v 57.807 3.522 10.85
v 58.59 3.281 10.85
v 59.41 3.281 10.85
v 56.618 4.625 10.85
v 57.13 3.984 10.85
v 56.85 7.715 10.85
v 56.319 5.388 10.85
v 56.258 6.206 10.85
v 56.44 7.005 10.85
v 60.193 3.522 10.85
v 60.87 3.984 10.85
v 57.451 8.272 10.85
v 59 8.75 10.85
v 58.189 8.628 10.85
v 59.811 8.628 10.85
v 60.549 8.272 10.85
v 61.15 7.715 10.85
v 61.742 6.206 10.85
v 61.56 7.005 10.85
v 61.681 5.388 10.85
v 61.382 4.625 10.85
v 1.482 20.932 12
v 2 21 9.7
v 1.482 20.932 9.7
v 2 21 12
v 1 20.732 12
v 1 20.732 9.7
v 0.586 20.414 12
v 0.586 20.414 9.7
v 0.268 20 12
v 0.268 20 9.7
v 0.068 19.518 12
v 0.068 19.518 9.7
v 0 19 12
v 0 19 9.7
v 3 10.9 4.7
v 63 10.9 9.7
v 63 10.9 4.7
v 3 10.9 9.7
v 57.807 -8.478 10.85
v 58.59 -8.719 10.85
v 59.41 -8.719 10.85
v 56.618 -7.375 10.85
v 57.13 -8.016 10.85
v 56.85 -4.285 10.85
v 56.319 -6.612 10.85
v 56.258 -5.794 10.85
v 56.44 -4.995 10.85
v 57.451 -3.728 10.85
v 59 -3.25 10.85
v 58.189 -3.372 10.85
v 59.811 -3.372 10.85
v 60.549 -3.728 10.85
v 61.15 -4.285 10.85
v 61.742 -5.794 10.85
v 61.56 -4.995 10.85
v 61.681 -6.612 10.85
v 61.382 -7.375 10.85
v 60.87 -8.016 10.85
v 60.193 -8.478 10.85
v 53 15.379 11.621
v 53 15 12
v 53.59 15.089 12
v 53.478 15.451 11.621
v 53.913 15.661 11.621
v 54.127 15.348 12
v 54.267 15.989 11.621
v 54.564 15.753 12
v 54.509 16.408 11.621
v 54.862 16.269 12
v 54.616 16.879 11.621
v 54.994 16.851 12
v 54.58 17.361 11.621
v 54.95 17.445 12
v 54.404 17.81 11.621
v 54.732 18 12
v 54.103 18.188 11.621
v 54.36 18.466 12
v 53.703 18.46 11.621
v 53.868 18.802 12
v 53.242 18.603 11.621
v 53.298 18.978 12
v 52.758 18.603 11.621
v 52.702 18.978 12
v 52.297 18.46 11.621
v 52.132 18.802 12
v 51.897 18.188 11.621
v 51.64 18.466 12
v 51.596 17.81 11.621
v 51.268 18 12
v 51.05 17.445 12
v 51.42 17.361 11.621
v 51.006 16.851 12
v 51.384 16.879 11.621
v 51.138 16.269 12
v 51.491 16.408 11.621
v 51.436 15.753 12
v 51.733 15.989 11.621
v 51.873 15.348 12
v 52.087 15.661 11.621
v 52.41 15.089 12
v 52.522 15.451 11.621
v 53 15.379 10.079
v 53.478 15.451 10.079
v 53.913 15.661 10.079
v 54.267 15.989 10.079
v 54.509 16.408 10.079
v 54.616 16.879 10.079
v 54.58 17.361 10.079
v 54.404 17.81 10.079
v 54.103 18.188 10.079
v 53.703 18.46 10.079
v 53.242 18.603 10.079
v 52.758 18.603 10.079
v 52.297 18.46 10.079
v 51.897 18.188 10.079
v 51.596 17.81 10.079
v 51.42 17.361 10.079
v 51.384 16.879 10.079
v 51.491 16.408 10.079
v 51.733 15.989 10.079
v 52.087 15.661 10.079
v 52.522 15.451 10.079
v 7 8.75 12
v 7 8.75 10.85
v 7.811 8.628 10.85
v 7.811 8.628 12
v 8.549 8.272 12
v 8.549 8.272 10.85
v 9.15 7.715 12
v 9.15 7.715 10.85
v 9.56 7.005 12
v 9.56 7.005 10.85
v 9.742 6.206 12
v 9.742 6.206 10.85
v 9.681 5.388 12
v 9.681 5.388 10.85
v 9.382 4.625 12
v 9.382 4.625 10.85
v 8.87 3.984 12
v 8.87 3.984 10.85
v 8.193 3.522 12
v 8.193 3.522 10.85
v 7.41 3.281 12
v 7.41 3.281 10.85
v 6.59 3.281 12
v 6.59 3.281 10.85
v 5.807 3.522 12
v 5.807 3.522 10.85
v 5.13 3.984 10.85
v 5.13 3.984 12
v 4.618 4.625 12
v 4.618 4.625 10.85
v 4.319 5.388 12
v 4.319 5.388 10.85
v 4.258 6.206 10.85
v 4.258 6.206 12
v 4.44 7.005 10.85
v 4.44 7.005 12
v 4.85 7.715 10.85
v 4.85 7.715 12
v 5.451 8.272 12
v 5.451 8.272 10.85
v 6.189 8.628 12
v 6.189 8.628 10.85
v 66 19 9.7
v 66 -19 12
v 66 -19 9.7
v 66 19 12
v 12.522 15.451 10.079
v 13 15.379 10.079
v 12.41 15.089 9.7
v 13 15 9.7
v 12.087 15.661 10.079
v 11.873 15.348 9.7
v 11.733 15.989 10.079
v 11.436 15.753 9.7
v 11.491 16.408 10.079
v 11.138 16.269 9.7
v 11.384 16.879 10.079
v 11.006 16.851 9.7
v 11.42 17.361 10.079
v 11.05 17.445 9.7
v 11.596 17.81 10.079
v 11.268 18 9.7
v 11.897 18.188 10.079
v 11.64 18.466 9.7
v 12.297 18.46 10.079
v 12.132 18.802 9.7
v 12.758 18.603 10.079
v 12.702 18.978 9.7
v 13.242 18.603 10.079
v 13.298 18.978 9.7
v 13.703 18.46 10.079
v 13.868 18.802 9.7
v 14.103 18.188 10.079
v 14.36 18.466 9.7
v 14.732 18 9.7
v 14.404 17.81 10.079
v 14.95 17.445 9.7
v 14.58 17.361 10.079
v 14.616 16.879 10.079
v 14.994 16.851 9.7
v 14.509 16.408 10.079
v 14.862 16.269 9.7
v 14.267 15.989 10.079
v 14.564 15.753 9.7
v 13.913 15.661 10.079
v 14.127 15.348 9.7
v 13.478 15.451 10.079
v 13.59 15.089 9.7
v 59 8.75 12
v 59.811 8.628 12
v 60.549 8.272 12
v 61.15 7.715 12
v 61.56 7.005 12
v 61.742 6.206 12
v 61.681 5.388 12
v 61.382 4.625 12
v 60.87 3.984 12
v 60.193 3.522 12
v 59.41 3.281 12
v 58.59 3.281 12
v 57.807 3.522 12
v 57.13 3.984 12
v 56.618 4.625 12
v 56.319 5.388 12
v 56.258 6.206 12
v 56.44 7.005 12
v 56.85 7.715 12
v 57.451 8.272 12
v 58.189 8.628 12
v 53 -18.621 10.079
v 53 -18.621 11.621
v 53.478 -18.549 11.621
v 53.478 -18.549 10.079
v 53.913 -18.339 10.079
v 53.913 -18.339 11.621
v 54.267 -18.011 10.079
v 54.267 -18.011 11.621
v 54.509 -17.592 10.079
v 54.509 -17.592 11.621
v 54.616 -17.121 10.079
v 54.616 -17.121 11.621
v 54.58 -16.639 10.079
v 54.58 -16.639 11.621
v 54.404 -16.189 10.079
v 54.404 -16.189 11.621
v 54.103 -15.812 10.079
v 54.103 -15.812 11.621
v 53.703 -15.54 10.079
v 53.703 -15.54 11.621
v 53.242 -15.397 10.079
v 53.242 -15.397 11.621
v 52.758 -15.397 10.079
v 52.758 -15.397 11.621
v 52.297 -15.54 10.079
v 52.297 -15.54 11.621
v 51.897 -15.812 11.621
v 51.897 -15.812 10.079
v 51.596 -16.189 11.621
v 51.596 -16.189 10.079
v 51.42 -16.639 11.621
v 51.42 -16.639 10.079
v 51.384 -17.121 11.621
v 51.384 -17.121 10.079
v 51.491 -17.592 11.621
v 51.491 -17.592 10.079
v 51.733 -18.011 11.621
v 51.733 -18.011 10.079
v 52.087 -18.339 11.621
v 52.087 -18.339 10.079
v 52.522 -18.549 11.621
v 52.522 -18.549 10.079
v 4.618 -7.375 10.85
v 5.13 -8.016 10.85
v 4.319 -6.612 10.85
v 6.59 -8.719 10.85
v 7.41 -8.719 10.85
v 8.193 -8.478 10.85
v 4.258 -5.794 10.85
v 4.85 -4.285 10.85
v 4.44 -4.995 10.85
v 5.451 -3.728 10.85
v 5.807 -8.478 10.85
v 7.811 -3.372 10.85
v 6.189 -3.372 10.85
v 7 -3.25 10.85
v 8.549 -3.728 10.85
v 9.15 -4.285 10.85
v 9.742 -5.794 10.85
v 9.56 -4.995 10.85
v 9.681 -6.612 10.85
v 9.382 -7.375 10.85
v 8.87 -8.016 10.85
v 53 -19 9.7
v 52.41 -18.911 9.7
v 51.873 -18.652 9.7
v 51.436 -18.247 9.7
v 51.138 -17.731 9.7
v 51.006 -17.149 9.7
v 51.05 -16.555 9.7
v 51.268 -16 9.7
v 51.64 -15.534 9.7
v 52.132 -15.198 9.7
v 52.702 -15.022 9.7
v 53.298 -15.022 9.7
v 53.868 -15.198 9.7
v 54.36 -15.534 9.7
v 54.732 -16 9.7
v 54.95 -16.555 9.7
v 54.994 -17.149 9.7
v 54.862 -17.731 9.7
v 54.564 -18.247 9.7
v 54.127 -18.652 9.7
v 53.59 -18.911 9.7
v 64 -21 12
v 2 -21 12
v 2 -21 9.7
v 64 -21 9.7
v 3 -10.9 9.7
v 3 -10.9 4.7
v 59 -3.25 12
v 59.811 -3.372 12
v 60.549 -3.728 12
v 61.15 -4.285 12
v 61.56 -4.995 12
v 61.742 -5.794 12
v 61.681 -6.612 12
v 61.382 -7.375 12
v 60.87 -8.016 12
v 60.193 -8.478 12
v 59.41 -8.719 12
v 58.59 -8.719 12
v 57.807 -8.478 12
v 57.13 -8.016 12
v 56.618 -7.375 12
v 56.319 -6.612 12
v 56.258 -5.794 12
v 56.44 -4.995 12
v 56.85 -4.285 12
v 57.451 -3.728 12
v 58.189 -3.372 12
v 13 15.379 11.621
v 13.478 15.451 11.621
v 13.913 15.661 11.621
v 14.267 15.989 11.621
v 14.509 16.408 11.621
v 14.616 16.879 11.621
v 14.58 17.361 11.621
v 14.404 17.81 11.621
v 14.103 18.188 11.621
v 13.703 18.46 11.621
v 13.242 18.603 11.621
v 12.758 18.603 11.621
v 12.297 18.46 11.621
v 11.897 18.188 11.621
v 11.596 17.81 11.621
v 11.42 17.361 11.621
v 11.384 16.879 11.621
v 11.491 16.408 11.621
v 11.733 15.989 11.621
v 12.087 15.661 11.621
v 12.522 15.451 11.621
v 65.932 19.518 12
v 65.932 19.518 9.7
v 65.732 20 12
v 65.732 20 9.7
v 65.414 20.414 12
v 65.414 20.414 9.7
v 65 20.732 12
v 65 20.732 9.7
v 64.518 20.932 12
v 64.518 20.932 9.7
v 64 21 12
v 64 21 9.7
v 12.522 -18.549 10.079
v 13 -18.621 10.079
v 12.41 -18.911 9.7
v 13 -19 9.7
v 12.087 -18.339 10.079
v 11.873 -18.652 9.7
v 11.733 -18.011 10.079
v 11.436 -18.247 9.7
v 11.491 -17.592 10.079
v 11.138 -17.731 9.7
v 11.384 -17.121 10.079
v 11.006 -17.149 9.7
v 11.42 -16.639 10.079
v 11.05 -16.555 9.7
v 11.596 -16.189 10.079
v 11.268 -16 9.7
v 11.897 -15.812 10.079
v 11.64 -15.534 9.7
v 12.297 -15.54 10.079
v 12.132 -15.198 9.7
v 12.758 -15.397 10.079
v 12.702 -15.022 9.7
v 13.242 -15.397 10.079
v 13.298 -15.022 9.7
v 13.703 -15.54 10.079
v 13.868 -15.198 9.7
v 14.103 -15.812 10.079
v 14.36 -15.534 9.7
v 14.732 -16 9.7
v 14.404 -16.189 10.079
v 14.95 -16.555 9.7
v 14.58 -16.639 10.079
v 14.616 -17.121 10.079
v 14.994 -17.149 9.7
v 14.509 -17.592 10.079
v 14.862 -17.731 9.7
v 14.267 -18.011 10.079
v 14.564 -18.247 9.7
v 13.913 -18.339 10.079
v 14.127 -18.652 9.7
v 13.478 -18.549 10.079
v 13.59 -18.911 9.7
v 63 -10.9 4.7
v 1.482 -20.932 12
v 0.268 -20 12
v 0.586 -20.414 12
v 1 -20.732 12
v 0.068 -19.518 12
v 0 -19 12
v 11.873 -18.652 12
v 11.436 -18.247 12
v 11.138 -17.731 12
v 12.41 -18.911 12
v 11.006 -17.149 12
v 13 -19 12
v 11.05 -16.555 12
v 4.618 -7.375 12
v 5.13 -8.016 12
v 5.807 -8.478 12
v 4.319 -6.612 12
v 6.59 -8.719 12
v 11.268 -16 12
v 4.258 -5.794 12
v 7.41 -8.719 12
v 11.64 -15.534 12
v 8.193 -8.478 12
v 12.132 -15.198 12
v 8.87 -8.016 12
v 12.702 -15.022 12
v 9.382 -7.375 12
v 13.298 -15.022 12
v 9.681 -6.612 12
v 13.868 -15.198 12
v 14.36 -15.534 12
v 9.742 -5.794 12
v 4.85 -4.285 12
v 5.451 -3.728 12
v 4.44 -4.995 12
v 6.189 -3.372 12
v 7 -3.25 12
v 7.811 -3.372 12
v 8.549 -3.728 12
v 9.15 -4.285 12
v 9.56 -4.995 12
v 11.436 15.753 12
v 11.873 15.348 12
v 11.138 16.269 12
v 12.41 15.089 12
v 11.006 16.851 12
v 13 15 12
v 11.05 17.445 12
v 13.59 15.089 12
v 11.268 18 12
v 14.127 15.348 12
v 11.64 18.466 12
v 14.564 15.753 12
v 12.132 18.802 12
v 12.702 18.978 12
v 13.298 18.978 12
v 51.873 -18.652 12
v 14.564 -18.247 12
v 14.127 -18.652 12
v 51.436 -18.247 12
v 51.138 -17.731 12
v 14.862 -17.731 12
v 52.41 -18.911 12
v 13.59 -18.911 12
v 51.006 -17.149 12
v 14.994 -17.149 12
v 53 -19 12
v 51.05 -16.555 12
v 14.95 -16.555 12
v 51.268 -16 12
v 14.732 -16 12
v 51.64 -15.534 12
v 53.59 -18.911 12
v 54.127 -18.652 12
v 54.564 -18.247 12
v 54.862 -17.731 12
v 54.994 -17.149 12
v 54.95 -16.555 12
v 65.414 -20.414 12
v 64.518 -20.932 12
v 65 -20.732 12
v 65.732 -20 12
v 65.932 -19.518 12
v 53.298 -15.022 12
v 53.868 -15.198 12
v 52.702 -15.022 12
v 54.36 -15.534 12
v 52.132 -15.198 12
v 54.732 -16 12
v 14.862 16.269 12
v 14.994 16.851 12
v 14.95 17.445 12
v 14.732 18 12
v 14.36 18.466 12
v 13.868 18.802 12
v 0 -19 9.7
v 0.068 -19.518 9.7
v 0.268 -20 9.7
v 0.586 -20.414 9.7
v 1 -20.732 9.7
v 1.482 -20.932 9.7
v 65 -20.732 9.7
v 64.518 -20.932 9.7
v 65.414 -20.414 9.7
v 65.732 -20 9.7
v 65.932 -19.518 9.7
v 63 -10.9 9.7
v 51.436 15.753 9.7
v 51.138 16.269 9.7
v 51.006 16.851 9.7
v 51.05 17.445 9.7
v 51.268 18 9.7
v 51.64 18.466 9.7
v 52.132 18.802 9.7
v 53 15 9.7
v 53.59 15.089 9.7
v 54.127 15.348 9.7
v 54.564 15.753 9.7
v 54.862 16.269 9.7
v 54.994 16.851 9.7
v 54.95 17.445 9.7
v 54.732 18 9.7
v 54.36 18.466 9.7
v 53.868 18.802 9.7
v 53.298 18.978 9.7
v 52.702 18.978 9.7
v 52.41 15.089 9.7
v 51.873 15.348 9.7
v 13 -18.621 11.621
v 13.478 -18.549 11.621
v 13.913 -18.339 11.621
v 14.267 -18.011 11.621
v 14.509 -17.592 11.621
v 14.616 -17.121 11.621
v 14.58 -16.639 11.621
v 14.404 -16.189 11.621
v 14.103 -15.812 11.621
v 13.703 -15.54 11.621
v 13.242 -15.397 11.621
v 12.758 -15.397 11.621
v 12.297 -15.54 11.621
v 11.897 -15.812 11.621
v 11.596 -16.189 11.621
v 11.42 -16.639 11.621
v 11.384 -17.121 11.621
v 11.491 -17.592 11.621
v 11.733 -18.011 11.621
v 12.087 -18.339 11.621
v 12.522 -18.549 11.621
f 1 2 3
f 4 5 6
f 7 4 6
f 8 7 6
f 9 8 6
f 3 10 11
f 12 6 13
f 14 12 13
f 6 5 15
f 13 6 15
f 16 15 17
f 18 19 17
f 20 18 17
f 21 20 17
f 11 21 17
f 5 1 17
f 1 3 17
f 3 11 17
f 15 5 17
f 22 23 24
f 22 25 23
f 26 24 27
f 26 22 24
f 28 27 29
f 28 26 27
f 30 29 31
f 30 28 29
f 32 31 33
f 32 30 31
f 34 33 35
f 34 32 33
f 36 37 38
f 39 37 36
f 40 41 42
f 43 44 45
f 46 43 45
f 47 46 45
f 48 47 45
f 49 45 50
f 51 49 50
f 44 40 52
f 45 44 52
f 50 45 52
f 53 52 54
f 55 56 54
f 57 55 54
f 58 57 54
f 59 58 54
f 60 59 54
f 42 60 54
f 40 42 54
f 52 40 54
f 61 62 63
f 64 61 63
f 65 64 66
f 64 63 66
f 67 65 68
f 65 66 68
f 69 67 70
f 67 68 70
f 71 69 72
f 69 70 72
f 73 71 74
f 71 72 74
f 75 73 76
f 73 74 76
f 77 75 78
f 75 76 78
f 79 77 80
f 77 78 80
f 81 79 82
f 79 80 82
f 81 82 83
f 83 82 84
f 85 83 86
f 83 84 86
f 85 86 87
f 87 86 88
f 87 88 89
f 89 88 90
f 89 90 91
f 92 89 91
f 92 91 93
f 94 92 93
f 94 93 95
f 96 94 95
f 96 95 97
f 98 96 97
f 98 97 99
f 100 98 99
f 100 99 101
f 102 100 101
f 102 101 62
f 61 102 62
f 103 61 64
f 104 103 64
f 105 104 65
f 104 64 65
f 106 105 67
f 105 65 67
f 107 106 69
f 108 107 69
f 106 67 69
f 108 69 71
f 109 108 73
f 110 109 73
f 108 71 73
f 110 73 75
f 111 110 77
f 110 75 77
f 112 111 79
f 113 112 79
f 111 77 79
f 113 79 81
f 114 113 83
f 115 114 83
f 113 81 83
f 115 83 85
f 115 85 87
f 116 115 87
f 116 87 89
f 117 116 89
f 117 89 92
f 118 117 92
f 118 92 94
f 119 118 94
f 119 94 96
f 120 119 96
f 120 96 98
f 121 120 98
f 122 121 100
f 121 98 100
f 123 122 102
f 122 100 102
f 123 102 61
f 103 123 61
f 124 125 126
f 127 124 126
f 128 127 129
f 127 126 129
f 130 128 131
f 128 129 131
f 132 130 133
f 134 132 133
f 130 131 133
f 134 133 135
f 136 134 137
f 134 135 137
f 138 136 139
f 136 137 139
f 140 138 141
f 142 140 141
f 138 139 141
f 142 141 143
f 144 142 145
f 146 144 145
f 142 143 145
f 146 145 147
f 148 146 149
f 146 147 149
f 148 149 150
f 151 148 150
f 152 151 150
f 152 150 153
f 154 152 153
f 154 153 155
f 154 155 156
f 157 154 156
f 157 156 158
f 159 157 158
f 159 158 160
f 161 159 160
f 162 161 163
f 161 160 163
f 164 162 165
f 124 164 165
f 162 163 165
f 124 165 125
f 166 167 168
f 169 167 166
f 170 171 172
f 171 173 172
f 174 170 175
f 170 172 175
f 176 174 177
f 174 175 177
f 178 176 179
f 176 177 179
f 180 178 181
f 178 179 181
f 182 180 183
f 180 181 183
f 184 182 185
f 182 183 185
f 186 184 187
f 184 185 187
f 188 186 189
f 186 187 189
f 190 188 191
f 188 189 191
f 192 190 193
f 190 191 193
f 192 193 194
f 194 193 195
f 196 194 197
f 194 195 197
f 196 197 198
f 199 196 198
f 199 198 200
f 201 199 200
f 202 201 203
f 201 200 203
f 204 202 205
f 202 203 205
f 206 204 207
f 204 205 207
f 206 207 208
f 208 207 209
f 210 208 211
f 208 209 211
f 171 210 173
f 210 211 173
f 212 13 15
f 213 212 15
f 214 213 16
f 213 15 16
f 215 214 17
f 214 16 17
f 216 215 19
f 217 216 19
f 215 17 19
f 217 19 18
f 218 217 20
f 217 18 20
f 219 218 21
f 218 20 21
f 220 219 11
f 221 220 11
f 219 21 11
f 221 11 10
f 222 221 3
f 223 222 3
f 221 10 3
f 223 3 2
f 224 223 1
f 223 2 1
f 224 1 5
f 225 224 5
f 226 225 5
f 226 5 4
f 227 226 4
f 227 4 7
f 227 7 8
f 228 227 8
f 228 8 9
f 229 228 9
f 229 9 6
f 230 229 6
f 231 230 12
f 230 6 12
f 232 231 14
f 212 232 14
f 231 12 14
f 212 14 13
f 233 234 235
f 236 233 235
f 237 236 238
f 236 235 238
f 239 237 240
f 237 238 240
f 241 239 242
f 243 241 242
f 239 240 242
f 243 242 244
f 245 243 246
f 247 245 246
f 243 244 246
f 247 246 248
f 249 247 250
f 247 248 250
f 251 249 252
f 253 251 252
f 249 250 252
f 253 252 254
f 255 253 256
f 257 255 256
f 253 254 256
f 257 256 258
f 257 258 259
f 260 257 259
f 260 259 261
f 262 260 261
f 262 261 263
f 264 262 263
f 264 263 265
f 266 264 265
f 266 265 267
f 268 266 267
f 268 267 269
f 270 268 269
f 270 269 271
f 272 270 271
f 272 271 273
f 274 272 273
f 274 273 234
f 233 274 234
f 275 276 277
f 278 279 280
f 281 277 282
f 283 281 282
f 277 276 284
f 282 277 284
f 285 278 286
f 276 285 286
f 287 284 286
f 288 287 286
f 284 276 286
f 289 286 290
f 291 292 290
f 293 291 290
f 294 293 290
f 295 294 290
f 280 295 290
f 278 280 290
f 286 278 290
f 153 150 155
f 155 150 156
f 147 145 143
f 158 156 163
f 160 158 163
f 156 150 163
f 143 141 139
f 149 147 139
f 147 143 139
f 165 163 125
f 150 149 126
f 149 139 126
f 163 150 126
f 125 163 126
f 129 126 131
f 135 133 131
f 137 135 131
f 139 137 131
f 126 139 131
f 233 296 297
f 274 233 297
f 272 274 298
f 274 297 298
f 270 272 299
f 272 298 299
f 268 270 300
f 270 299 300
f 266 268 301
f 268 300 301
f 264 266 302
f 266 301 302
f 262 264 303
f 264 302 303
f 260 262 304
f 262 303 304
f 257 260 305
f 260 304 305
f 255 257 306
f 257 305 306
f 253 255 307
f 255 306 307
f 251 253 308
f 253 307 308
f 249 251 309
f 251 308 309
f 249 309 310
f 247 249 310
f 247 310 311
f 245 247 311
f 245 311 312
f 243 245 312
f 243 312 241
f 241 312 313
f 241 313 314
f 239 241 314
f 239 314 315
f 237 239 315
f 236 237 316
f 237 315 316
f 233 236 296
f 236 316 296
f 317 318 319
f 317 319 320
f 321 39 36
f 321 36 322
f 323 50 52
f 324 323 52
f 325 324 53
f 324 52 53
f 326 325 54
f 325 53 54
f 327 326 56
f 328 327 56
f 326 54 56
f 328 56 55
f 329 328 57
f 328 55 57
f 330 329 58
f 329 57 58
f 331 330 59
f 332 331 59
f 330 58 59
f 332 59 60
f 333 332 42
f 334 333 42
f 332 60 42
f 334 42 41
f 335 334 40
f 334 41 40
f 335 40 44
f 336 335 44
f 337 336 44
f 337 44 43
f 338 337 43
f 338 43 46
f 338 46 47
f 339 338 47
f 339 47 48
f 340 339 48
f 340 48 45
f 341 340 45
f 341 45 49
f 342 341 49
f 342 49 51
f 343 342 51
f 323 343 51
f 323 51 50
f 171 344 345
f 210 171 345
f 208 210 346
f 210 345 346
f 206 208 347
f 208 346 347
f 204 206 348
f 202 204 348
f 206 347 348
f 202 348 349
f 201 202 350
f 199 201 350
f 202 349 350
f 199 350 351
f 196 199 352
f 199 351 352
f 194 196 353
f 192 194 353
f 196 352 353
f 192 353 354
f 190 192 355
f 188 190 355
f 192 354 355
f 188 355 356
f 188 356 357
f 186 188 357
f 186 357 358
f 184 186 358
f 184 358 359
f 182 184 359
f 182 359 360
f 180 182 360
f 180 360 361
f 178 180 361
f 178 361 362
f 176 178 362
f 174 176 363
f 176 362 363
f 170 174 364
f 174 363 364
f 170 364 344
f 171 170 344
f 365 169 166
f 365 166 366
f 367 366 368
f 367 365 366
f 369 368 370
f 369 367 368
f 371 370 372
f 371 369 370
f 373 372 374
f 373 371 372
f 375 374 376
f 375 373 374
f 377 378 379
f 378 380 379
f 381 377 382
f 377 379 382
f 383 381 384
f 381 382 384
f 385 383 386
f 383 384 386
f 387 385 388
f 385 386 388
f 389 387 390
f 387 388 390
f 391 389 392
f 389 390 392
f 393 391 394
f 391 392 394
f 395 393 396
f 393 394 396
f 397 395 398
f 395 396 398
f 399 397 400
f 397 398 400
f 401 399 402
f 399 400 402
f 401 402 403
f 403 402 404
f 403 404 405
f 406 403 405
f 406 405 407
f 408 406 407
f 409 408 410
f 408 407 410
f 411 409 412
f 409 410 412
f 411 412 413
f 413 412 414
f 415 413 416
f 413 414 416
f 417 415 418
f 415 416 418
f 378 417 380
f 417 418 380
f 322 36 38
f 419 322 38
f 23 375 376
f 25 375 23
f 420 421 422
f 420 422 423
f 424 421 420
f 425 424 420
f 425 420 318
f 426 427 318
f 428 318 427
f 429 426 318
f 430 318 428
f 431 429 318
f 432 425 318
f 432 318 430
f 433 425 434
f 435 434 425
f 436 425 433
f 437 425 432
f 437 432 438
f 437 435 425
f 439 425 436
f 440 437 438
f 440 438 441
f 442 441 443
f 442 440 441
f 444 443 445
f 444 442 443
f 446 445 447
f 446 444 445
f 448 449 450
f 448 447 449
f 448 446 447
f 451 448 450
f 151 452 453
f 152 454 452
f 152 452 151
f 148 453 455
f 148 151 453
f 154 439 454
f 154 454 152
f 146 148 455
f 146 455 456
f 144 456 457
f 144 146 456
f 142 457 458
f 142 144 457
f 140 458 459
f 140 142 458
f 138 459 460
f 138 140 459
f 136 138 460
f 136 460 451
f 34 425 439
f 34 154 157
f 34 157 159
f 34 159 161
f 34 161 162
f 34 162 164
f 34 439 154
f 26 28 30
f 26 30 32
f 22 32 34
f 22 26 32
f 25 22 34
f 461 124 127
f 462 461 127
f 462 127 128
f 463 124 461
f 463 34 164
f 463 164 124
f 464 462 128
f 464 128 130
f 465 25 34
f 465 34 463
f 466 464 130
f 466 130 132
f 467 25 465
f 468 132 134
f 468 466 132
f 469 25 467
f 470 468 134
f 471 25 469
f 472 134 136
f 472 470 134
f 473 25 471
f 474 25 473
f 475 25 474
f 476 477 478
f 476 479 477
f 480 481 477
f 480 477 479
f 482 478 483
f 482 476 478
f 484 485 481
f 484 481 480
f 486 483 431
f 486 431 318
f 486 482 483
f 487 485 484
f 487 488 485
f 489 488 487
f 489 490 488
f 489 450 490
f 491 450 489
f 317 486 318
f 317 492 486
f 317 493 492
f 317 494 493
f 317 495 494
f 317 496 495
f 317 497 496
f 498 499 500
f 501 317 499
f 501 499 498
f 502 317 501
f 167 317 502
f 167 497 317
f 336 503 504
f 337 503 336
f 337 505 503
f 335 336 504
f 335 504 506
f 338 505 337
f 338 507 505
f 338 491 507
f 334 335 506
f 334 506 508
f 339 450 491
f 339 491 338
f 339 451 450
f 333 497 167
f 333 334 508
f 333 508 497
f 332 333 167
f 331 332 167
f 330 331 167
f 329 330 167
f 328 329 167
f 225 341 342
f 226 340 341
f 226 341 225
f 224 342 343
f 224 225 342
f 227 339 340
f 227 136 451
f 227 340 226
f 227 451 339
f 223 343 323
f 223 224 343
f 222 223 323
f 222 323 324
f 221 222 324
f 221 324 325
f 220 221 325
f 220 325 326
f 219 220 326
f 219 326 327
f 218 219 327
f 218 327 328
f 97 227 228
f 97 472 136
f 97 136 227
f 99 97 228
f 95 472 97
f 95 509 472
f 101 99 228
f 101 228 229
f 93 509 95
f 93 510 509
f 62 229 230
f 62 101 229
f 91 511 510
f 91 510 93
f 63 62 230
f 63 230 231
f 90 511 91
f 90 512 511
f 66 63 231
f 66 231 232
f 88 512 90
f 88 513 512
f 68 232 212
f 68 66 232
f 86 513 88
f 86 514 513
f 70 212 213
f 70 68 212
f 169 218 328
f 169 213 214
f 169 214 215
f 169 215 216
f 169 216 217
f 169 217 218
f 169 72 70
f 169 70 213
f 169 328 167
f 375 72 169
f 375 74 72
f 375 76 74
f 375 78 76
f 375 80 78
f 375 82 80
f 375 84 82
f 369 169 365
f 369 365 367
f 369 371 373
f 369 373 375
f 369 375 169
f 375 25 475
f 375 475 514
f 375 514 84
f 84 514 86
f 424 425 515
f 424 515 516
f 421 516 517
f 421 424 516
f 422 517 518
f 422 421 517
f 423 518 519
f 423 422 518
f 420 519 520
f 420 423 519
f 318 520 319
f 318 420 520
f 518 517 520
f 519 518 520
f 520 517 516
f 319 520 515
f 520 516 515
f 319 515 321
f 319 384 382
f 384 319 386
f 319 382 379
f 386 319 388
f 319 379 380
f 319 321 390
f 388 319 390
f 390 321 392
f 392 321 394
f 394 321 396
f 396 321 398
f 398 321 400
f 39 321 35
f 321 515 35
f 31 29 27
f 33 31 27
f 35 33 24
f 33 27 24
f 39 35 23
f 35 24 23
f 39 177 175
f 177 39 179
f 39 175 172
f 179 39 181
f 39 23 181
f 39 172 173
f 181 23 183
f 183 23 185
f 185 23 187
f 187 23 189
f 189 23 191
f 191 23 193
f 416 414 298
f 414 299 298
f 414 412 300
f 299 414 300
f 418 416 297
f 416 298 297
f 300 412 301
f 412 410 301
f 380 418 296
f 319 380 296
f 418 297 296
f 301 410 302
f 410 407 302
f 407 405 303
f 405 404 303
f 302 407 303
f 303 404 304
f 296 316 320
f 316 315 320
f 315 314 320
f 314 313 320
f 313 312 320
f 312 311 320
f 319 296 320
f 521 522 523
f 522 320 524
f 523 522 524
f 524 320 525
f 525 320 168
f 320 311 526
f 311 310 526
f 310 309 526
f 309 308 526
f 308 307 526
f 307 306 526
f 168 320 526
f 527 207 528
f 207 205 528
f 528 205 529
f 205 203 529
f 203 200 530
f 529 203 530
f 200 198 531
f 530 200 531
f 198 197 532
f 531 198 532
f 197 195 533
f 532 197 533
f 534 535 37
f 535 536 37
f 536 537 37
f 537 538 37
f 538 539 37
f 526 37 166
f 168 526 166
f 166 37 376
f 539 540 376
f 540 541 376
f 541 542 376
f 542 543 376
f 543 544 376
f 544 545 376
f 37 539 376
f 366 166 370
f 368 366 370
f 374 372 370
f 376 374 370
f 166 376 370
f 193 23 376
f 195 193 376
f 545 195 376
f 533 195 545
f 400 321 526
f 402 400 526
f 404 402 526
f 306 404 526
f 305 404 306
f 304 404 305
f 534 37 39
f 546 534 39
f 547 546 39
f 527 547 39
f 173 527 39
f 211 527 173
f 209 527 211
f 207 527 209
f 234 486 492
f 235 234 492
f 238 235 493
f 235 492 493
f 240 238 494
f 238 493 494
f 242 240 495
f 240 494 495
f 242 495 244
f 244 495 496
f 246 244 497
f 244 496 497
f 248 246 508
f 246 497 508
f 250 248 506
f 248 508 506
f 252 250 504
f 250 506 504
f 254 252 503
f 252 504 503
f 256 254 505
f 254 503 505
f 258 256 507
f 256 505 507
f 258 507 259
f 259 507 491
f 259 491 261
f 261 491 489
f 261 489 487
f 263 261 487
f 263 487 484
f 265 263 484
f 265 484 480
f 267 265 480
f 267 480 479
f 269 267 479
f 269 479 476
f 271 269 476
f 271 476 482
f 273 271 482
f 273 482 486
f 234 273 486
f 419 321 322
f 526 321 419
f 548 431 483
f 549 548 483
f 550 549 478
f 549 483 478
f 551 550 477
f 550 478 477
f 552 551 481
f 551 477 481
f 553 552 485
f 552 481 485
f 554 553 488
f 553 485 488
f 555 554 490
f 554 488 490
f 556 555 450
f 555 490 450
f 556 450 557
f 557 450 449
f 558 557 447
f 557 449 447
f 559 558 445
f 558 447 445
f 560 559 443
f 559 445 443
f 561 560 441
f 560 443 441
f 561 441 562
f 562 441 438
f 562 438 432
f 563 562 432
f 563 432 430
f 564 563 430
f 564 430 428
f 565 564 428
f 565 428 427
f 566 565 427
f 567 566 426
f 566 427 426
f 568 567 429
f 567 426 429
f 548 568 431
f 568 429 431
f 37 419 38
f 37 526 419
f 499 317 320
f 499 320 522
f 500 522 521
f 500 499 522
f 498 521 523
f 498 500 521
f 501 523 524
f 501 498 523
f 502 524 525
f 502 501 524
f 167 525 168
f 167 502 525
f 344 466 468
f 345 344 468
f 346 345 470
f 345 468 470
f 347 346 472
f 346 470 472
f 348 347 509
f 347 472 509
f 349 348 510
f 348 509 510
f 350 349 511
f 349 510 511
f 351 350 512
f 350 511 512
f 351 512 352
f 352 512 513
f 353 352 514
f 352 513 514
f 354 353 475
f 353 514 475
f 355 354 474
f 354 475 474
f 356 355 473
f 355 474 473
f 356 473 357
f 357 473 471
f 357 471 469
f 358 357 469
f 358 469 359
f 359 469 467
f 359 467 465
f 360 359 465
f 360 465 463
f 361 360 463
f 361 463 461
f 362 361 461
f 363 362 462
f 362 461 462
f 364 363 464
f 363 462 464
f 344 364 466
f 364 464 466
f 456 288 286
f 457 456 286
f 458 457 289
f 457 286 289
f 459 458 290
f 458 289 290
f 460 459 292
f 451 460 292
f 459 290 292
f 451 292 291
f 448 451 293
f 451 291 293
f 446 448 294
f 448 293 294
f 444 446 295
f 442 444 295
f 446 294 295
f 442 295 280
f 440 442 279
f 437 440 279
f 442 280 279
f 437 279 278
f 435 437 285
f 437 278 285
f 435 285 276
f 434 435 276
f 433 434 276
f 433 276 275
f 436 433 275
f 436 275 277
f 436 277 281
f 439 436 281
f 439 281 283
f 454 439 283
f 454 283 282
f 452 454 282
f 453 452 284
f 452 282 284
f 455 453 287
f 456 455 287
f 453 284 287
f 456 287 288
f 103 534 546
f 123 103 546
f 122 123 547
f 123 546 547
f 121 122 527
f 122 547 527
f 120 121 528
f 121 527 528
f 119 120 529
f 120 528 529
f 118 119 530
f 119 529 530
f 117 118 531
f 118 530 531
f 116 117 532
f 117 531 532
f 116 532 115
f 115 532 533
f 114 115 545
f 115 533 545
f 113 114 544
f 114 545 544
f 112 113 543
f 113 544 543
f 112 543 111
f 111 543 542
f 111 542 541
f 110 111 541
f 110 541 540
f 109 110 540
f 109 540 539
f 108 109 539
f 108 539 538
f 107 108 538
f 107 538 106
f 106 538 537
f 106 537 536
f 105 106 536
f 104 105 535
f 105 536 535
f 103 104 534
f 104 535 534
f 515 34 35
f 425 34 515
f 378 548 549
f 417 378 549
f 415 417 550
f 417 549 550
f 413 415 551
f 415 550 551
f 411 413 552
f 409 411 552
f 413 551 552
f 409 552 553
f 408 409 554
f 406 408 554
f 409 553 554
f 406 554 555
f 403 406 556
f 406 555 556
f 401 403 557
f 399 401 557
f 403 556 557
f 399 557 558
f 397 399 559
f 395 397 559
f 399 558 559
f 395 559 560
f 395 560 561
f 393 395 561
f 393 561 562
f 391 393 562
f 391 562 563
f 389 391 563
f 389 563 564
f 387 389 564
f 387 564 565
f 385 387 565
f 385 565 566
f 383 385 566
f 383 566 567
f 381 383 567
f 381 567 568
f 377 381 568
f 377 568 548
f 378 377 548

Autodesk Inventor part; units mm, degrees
sketch "Sketch_1" plane through (0, 0, 12) normal (0, 0, 1) x (1, 0, 0)
  arc A0 (0, -19) -> (2, -21) centre (2, -19) ccw
  line L0 (2, -21) -> (64, -21)
  arc A1 (64, -21) -> (66, -19) centre (64, -19) ccw
  line L1 (66, -19) -> (66, 19)
  arc A2 (66, 19) -> (64, 21) centre (64, 19) ccw
  line L2 (64, 21) -> (2, 21)
  arc A3 (2, 21) -> (0, 19) centre (2, 19) ccw
  line L3 (0, 19) -> (0, -19)
extrude "Extrusion1" add sketch "Sketch_1" against normal blind 2.3
sketch "Sketch_6" plane through (0, 0, 9.7) normal (0, 0, 1) x (1, 0, 0)
  line L0 (3, 10.9) -> (3, -10.9)
  line L1 (3, -10.9) -> (63, -10.9)
  line L2 (63, -10.9) -> (63, 10.9)
  line L3 (63, 10.9) -> (3, 10.9)
extrude "Extrusion2" add sketch "Sketch_6" against normal blind 5
sketch "Sketch_2_ALT_Drilling_1" plane through (13, 0, 0) normal (1, 0, 0) x (0, 0, -1)
  line L0 (-12, 17) -> (-9.7, 17)
  line L1 (-9.7, 17) -> (-9.7, 15)
  line L2 (-9.7, 15) -> (-10.079, 15.379)
  line L3 (-10.079, 15.379) -> (-11.621, 15.379)
  line L4 (-11.621, 15.379) -> (-12, 15)
  line L5 (-12, 15) -> (-12, 17)
  line L6 (-12, 17) -> (-9.7, 17)
revolve "Revolution1" cut sketch "Sketch_2_ALT_Drilling_1" angle 360 about axis through (13, 17, 12) along (0, 0, 1)
thread "Thread1" size "M4x0.7" class "6H" standard "ISO Metric profile" full length
sketch "Sketch_3_ALT_Drilling_2" plane through (13, 0, 0) normal (1, 0, 0) x (0, 0, -1)
  line L0 (-12, -17) -> (-9.7, -17)
  line L1 (-9.7, -17) -> (-9.7, -19)
  line L2 (-9.7, -19) -> (-10.079, -18.621)
  line L3 (-10.079, -18.621) -> (-11.621, -18.621)
  line L4 (-11.621, -18.621) -> (-12, -19)
  line L5 (-12, -19) -> (-12, -17)
  line L6 (-12, -17) -> (-9.7, -17)
revolve "Revolution2" cut sketch "Sketch_3_ALT_Drilling_2" angle 360 about axis through (13, -17, 12) along (0, 0, 1)
thread "Thread2" size "M4x0.7" class "6H" standard "ISO Metric profile" full length
sketch "Sketch_4_ALT_Drilling_3" plane through (53, 0, 0) normal (1, 0, 0) x (0, 0, -1)
  line L0 (-12, 17) -> (-9.7, 17)
  line L1 (-9.7, 17) -> (-9.7, 15)
  line L2 (-9.7, 15) -> (-10.079, 15.379)
  line L3 (-10.079, 15.379) -> (-11.621, 15.379)
  line L4 (-11.621, 15.379) -> (-12, 15)
  line L5 (-12, 15) -> (-12, 17)
  line L6 (-12, 17) -> (-9.7, 17)
revolve "Revolution3" cut sketch "Sketch_4_ALT_Drilling_3" angle 360 about axis through (53, 17, 12) along (0, 0, 1)
thread "Thread3" size "M4x0.7" class "6H" standard "ISO Metric profile" full length
sketch "Sketch_5_ALT_Drilling_4" plane through (53, 0, 0) normal (1, 0, 0) x (0, 0, -1)
  line L0 (-12, -17) -> (-9.7, -17)
  line L1 (-9.7, -17) -> (-9.7, -19)
  line L2 (-9.7, -19) -> (-10.079, -18.621)
  line L3 (-10.079, -18.621) -> (-11.621, -18.621)
  line L4 (-11.621, -18.621) -> (-12, -19)
  line L5 (-12, -19) -> (-12, -17)
  line L6 (-12, -17) -> (-9.7, -17)
revolve "Revolution4" cut sketch "Sketch_5_ALT_Drilling_4" angle 360 about axis through (53, -17, 12) along (0, 0, 1)
thread "Thread4" size "M4x0.7" class "6H" standard "ISO Metric profile" full length
sketch "Sketch_8_ALT_Drilling_5" plane through (7, 0, 0) normal (1, 0, 0) x (0, 0, -1)
  line L0 (-10.85, 6) -> (-12, 6)
  line L1 (-12, 6) -> (-12, 8.75)
  line L2 (-12, 8.75) -> (-10.85, 8.75)
  line L3 (-10.85, 8.75) -> (-10.85, 6)
  line L4 (-10.85, 6) -> (-12, 6)
revolve "Revolution5" cut sketch "Sketch_8_ALT_Drilling_5" angle 360 about axis through (7, 6, 10.85) along (0, 0, -1)
sketch "Sketch_9_ALT_Drilling_6" plane through (7, 0, 0) normal (1, 0, 0) x (0, 0, -1)
  line L0 (-10.85, -6) -> (-12, -6)
  line L1 (-12, -6) -> (-12, -3.25)
  line L2 (-12, -3.25) -> (-10.85, -3.25)
  line L3 (-10.85, -3.25) -> (-10.85, -6)
  line L4 (-10.85, -6) -> (-12, -6)
revolve "Revolution6" cut sketch "Sketch_9_ALT_Drilling_6" angle 360 about axis through (7, -6, 10.85) along (0, 0, -1)
sketch "Sketch_10_ALT_Drilling_7" plane through (59, 0, 0) normal (1, 0, 0) x (0, 0, -1)
  line L0 (-10.85, 6) -> (-12, 6)
  line L1 (-12, 6) -> (-12, 8.75)
  line L2 (-12, 8.75) -> (-10.85, 8.75)
  line L3 (-10.85, 8.75) -> (-10.85, 6)
  line L4 (-10.85, 6) -> (-12, 6)
revolve "Revolution7" cut sketch "Sketch_10_ALT_Drilling_7" angle 360 about axis through (59, 6, 10.85) along (0, 0, -1)
sketch "Sketch_11_ALT_Drilling_8" plane through (59, 0, 0) normal (1, 0, 0) x (0, 0, -1)
  line L0 (-10.85, -6) -> (-12, -6)
  line L1 (-12, -6) -> (-12, -3.25)
  line L2 (-12, -3.25) -> (-10.85, -3.25)
  line L3 (-10.85, -3.25) -> (-10.85, -6)
  line L4 (-10.85, -6) -> (-12, -6)
revolve "Revolution8" cut sketch "Sketch_11_ALT_Drilling_8" angle 360 about axis through (59, -6, 10.85) along (0, 0, -1)
ref_plane "slider_ip1_XY" through (0, 0, 0) normal (1, 0, 0) x (0, 0, -1)
ref_plane "slider_ip1_YZ" through (0, 0, 0) normal (0, 0, -1) x (0, 1, 0)
ref_plane "slider_ip1_ZX" through (0, 0, 0) normal (0, 1, 0) x (1, 0, 0)
properties part number "FBW2560R+640 L Slider"
